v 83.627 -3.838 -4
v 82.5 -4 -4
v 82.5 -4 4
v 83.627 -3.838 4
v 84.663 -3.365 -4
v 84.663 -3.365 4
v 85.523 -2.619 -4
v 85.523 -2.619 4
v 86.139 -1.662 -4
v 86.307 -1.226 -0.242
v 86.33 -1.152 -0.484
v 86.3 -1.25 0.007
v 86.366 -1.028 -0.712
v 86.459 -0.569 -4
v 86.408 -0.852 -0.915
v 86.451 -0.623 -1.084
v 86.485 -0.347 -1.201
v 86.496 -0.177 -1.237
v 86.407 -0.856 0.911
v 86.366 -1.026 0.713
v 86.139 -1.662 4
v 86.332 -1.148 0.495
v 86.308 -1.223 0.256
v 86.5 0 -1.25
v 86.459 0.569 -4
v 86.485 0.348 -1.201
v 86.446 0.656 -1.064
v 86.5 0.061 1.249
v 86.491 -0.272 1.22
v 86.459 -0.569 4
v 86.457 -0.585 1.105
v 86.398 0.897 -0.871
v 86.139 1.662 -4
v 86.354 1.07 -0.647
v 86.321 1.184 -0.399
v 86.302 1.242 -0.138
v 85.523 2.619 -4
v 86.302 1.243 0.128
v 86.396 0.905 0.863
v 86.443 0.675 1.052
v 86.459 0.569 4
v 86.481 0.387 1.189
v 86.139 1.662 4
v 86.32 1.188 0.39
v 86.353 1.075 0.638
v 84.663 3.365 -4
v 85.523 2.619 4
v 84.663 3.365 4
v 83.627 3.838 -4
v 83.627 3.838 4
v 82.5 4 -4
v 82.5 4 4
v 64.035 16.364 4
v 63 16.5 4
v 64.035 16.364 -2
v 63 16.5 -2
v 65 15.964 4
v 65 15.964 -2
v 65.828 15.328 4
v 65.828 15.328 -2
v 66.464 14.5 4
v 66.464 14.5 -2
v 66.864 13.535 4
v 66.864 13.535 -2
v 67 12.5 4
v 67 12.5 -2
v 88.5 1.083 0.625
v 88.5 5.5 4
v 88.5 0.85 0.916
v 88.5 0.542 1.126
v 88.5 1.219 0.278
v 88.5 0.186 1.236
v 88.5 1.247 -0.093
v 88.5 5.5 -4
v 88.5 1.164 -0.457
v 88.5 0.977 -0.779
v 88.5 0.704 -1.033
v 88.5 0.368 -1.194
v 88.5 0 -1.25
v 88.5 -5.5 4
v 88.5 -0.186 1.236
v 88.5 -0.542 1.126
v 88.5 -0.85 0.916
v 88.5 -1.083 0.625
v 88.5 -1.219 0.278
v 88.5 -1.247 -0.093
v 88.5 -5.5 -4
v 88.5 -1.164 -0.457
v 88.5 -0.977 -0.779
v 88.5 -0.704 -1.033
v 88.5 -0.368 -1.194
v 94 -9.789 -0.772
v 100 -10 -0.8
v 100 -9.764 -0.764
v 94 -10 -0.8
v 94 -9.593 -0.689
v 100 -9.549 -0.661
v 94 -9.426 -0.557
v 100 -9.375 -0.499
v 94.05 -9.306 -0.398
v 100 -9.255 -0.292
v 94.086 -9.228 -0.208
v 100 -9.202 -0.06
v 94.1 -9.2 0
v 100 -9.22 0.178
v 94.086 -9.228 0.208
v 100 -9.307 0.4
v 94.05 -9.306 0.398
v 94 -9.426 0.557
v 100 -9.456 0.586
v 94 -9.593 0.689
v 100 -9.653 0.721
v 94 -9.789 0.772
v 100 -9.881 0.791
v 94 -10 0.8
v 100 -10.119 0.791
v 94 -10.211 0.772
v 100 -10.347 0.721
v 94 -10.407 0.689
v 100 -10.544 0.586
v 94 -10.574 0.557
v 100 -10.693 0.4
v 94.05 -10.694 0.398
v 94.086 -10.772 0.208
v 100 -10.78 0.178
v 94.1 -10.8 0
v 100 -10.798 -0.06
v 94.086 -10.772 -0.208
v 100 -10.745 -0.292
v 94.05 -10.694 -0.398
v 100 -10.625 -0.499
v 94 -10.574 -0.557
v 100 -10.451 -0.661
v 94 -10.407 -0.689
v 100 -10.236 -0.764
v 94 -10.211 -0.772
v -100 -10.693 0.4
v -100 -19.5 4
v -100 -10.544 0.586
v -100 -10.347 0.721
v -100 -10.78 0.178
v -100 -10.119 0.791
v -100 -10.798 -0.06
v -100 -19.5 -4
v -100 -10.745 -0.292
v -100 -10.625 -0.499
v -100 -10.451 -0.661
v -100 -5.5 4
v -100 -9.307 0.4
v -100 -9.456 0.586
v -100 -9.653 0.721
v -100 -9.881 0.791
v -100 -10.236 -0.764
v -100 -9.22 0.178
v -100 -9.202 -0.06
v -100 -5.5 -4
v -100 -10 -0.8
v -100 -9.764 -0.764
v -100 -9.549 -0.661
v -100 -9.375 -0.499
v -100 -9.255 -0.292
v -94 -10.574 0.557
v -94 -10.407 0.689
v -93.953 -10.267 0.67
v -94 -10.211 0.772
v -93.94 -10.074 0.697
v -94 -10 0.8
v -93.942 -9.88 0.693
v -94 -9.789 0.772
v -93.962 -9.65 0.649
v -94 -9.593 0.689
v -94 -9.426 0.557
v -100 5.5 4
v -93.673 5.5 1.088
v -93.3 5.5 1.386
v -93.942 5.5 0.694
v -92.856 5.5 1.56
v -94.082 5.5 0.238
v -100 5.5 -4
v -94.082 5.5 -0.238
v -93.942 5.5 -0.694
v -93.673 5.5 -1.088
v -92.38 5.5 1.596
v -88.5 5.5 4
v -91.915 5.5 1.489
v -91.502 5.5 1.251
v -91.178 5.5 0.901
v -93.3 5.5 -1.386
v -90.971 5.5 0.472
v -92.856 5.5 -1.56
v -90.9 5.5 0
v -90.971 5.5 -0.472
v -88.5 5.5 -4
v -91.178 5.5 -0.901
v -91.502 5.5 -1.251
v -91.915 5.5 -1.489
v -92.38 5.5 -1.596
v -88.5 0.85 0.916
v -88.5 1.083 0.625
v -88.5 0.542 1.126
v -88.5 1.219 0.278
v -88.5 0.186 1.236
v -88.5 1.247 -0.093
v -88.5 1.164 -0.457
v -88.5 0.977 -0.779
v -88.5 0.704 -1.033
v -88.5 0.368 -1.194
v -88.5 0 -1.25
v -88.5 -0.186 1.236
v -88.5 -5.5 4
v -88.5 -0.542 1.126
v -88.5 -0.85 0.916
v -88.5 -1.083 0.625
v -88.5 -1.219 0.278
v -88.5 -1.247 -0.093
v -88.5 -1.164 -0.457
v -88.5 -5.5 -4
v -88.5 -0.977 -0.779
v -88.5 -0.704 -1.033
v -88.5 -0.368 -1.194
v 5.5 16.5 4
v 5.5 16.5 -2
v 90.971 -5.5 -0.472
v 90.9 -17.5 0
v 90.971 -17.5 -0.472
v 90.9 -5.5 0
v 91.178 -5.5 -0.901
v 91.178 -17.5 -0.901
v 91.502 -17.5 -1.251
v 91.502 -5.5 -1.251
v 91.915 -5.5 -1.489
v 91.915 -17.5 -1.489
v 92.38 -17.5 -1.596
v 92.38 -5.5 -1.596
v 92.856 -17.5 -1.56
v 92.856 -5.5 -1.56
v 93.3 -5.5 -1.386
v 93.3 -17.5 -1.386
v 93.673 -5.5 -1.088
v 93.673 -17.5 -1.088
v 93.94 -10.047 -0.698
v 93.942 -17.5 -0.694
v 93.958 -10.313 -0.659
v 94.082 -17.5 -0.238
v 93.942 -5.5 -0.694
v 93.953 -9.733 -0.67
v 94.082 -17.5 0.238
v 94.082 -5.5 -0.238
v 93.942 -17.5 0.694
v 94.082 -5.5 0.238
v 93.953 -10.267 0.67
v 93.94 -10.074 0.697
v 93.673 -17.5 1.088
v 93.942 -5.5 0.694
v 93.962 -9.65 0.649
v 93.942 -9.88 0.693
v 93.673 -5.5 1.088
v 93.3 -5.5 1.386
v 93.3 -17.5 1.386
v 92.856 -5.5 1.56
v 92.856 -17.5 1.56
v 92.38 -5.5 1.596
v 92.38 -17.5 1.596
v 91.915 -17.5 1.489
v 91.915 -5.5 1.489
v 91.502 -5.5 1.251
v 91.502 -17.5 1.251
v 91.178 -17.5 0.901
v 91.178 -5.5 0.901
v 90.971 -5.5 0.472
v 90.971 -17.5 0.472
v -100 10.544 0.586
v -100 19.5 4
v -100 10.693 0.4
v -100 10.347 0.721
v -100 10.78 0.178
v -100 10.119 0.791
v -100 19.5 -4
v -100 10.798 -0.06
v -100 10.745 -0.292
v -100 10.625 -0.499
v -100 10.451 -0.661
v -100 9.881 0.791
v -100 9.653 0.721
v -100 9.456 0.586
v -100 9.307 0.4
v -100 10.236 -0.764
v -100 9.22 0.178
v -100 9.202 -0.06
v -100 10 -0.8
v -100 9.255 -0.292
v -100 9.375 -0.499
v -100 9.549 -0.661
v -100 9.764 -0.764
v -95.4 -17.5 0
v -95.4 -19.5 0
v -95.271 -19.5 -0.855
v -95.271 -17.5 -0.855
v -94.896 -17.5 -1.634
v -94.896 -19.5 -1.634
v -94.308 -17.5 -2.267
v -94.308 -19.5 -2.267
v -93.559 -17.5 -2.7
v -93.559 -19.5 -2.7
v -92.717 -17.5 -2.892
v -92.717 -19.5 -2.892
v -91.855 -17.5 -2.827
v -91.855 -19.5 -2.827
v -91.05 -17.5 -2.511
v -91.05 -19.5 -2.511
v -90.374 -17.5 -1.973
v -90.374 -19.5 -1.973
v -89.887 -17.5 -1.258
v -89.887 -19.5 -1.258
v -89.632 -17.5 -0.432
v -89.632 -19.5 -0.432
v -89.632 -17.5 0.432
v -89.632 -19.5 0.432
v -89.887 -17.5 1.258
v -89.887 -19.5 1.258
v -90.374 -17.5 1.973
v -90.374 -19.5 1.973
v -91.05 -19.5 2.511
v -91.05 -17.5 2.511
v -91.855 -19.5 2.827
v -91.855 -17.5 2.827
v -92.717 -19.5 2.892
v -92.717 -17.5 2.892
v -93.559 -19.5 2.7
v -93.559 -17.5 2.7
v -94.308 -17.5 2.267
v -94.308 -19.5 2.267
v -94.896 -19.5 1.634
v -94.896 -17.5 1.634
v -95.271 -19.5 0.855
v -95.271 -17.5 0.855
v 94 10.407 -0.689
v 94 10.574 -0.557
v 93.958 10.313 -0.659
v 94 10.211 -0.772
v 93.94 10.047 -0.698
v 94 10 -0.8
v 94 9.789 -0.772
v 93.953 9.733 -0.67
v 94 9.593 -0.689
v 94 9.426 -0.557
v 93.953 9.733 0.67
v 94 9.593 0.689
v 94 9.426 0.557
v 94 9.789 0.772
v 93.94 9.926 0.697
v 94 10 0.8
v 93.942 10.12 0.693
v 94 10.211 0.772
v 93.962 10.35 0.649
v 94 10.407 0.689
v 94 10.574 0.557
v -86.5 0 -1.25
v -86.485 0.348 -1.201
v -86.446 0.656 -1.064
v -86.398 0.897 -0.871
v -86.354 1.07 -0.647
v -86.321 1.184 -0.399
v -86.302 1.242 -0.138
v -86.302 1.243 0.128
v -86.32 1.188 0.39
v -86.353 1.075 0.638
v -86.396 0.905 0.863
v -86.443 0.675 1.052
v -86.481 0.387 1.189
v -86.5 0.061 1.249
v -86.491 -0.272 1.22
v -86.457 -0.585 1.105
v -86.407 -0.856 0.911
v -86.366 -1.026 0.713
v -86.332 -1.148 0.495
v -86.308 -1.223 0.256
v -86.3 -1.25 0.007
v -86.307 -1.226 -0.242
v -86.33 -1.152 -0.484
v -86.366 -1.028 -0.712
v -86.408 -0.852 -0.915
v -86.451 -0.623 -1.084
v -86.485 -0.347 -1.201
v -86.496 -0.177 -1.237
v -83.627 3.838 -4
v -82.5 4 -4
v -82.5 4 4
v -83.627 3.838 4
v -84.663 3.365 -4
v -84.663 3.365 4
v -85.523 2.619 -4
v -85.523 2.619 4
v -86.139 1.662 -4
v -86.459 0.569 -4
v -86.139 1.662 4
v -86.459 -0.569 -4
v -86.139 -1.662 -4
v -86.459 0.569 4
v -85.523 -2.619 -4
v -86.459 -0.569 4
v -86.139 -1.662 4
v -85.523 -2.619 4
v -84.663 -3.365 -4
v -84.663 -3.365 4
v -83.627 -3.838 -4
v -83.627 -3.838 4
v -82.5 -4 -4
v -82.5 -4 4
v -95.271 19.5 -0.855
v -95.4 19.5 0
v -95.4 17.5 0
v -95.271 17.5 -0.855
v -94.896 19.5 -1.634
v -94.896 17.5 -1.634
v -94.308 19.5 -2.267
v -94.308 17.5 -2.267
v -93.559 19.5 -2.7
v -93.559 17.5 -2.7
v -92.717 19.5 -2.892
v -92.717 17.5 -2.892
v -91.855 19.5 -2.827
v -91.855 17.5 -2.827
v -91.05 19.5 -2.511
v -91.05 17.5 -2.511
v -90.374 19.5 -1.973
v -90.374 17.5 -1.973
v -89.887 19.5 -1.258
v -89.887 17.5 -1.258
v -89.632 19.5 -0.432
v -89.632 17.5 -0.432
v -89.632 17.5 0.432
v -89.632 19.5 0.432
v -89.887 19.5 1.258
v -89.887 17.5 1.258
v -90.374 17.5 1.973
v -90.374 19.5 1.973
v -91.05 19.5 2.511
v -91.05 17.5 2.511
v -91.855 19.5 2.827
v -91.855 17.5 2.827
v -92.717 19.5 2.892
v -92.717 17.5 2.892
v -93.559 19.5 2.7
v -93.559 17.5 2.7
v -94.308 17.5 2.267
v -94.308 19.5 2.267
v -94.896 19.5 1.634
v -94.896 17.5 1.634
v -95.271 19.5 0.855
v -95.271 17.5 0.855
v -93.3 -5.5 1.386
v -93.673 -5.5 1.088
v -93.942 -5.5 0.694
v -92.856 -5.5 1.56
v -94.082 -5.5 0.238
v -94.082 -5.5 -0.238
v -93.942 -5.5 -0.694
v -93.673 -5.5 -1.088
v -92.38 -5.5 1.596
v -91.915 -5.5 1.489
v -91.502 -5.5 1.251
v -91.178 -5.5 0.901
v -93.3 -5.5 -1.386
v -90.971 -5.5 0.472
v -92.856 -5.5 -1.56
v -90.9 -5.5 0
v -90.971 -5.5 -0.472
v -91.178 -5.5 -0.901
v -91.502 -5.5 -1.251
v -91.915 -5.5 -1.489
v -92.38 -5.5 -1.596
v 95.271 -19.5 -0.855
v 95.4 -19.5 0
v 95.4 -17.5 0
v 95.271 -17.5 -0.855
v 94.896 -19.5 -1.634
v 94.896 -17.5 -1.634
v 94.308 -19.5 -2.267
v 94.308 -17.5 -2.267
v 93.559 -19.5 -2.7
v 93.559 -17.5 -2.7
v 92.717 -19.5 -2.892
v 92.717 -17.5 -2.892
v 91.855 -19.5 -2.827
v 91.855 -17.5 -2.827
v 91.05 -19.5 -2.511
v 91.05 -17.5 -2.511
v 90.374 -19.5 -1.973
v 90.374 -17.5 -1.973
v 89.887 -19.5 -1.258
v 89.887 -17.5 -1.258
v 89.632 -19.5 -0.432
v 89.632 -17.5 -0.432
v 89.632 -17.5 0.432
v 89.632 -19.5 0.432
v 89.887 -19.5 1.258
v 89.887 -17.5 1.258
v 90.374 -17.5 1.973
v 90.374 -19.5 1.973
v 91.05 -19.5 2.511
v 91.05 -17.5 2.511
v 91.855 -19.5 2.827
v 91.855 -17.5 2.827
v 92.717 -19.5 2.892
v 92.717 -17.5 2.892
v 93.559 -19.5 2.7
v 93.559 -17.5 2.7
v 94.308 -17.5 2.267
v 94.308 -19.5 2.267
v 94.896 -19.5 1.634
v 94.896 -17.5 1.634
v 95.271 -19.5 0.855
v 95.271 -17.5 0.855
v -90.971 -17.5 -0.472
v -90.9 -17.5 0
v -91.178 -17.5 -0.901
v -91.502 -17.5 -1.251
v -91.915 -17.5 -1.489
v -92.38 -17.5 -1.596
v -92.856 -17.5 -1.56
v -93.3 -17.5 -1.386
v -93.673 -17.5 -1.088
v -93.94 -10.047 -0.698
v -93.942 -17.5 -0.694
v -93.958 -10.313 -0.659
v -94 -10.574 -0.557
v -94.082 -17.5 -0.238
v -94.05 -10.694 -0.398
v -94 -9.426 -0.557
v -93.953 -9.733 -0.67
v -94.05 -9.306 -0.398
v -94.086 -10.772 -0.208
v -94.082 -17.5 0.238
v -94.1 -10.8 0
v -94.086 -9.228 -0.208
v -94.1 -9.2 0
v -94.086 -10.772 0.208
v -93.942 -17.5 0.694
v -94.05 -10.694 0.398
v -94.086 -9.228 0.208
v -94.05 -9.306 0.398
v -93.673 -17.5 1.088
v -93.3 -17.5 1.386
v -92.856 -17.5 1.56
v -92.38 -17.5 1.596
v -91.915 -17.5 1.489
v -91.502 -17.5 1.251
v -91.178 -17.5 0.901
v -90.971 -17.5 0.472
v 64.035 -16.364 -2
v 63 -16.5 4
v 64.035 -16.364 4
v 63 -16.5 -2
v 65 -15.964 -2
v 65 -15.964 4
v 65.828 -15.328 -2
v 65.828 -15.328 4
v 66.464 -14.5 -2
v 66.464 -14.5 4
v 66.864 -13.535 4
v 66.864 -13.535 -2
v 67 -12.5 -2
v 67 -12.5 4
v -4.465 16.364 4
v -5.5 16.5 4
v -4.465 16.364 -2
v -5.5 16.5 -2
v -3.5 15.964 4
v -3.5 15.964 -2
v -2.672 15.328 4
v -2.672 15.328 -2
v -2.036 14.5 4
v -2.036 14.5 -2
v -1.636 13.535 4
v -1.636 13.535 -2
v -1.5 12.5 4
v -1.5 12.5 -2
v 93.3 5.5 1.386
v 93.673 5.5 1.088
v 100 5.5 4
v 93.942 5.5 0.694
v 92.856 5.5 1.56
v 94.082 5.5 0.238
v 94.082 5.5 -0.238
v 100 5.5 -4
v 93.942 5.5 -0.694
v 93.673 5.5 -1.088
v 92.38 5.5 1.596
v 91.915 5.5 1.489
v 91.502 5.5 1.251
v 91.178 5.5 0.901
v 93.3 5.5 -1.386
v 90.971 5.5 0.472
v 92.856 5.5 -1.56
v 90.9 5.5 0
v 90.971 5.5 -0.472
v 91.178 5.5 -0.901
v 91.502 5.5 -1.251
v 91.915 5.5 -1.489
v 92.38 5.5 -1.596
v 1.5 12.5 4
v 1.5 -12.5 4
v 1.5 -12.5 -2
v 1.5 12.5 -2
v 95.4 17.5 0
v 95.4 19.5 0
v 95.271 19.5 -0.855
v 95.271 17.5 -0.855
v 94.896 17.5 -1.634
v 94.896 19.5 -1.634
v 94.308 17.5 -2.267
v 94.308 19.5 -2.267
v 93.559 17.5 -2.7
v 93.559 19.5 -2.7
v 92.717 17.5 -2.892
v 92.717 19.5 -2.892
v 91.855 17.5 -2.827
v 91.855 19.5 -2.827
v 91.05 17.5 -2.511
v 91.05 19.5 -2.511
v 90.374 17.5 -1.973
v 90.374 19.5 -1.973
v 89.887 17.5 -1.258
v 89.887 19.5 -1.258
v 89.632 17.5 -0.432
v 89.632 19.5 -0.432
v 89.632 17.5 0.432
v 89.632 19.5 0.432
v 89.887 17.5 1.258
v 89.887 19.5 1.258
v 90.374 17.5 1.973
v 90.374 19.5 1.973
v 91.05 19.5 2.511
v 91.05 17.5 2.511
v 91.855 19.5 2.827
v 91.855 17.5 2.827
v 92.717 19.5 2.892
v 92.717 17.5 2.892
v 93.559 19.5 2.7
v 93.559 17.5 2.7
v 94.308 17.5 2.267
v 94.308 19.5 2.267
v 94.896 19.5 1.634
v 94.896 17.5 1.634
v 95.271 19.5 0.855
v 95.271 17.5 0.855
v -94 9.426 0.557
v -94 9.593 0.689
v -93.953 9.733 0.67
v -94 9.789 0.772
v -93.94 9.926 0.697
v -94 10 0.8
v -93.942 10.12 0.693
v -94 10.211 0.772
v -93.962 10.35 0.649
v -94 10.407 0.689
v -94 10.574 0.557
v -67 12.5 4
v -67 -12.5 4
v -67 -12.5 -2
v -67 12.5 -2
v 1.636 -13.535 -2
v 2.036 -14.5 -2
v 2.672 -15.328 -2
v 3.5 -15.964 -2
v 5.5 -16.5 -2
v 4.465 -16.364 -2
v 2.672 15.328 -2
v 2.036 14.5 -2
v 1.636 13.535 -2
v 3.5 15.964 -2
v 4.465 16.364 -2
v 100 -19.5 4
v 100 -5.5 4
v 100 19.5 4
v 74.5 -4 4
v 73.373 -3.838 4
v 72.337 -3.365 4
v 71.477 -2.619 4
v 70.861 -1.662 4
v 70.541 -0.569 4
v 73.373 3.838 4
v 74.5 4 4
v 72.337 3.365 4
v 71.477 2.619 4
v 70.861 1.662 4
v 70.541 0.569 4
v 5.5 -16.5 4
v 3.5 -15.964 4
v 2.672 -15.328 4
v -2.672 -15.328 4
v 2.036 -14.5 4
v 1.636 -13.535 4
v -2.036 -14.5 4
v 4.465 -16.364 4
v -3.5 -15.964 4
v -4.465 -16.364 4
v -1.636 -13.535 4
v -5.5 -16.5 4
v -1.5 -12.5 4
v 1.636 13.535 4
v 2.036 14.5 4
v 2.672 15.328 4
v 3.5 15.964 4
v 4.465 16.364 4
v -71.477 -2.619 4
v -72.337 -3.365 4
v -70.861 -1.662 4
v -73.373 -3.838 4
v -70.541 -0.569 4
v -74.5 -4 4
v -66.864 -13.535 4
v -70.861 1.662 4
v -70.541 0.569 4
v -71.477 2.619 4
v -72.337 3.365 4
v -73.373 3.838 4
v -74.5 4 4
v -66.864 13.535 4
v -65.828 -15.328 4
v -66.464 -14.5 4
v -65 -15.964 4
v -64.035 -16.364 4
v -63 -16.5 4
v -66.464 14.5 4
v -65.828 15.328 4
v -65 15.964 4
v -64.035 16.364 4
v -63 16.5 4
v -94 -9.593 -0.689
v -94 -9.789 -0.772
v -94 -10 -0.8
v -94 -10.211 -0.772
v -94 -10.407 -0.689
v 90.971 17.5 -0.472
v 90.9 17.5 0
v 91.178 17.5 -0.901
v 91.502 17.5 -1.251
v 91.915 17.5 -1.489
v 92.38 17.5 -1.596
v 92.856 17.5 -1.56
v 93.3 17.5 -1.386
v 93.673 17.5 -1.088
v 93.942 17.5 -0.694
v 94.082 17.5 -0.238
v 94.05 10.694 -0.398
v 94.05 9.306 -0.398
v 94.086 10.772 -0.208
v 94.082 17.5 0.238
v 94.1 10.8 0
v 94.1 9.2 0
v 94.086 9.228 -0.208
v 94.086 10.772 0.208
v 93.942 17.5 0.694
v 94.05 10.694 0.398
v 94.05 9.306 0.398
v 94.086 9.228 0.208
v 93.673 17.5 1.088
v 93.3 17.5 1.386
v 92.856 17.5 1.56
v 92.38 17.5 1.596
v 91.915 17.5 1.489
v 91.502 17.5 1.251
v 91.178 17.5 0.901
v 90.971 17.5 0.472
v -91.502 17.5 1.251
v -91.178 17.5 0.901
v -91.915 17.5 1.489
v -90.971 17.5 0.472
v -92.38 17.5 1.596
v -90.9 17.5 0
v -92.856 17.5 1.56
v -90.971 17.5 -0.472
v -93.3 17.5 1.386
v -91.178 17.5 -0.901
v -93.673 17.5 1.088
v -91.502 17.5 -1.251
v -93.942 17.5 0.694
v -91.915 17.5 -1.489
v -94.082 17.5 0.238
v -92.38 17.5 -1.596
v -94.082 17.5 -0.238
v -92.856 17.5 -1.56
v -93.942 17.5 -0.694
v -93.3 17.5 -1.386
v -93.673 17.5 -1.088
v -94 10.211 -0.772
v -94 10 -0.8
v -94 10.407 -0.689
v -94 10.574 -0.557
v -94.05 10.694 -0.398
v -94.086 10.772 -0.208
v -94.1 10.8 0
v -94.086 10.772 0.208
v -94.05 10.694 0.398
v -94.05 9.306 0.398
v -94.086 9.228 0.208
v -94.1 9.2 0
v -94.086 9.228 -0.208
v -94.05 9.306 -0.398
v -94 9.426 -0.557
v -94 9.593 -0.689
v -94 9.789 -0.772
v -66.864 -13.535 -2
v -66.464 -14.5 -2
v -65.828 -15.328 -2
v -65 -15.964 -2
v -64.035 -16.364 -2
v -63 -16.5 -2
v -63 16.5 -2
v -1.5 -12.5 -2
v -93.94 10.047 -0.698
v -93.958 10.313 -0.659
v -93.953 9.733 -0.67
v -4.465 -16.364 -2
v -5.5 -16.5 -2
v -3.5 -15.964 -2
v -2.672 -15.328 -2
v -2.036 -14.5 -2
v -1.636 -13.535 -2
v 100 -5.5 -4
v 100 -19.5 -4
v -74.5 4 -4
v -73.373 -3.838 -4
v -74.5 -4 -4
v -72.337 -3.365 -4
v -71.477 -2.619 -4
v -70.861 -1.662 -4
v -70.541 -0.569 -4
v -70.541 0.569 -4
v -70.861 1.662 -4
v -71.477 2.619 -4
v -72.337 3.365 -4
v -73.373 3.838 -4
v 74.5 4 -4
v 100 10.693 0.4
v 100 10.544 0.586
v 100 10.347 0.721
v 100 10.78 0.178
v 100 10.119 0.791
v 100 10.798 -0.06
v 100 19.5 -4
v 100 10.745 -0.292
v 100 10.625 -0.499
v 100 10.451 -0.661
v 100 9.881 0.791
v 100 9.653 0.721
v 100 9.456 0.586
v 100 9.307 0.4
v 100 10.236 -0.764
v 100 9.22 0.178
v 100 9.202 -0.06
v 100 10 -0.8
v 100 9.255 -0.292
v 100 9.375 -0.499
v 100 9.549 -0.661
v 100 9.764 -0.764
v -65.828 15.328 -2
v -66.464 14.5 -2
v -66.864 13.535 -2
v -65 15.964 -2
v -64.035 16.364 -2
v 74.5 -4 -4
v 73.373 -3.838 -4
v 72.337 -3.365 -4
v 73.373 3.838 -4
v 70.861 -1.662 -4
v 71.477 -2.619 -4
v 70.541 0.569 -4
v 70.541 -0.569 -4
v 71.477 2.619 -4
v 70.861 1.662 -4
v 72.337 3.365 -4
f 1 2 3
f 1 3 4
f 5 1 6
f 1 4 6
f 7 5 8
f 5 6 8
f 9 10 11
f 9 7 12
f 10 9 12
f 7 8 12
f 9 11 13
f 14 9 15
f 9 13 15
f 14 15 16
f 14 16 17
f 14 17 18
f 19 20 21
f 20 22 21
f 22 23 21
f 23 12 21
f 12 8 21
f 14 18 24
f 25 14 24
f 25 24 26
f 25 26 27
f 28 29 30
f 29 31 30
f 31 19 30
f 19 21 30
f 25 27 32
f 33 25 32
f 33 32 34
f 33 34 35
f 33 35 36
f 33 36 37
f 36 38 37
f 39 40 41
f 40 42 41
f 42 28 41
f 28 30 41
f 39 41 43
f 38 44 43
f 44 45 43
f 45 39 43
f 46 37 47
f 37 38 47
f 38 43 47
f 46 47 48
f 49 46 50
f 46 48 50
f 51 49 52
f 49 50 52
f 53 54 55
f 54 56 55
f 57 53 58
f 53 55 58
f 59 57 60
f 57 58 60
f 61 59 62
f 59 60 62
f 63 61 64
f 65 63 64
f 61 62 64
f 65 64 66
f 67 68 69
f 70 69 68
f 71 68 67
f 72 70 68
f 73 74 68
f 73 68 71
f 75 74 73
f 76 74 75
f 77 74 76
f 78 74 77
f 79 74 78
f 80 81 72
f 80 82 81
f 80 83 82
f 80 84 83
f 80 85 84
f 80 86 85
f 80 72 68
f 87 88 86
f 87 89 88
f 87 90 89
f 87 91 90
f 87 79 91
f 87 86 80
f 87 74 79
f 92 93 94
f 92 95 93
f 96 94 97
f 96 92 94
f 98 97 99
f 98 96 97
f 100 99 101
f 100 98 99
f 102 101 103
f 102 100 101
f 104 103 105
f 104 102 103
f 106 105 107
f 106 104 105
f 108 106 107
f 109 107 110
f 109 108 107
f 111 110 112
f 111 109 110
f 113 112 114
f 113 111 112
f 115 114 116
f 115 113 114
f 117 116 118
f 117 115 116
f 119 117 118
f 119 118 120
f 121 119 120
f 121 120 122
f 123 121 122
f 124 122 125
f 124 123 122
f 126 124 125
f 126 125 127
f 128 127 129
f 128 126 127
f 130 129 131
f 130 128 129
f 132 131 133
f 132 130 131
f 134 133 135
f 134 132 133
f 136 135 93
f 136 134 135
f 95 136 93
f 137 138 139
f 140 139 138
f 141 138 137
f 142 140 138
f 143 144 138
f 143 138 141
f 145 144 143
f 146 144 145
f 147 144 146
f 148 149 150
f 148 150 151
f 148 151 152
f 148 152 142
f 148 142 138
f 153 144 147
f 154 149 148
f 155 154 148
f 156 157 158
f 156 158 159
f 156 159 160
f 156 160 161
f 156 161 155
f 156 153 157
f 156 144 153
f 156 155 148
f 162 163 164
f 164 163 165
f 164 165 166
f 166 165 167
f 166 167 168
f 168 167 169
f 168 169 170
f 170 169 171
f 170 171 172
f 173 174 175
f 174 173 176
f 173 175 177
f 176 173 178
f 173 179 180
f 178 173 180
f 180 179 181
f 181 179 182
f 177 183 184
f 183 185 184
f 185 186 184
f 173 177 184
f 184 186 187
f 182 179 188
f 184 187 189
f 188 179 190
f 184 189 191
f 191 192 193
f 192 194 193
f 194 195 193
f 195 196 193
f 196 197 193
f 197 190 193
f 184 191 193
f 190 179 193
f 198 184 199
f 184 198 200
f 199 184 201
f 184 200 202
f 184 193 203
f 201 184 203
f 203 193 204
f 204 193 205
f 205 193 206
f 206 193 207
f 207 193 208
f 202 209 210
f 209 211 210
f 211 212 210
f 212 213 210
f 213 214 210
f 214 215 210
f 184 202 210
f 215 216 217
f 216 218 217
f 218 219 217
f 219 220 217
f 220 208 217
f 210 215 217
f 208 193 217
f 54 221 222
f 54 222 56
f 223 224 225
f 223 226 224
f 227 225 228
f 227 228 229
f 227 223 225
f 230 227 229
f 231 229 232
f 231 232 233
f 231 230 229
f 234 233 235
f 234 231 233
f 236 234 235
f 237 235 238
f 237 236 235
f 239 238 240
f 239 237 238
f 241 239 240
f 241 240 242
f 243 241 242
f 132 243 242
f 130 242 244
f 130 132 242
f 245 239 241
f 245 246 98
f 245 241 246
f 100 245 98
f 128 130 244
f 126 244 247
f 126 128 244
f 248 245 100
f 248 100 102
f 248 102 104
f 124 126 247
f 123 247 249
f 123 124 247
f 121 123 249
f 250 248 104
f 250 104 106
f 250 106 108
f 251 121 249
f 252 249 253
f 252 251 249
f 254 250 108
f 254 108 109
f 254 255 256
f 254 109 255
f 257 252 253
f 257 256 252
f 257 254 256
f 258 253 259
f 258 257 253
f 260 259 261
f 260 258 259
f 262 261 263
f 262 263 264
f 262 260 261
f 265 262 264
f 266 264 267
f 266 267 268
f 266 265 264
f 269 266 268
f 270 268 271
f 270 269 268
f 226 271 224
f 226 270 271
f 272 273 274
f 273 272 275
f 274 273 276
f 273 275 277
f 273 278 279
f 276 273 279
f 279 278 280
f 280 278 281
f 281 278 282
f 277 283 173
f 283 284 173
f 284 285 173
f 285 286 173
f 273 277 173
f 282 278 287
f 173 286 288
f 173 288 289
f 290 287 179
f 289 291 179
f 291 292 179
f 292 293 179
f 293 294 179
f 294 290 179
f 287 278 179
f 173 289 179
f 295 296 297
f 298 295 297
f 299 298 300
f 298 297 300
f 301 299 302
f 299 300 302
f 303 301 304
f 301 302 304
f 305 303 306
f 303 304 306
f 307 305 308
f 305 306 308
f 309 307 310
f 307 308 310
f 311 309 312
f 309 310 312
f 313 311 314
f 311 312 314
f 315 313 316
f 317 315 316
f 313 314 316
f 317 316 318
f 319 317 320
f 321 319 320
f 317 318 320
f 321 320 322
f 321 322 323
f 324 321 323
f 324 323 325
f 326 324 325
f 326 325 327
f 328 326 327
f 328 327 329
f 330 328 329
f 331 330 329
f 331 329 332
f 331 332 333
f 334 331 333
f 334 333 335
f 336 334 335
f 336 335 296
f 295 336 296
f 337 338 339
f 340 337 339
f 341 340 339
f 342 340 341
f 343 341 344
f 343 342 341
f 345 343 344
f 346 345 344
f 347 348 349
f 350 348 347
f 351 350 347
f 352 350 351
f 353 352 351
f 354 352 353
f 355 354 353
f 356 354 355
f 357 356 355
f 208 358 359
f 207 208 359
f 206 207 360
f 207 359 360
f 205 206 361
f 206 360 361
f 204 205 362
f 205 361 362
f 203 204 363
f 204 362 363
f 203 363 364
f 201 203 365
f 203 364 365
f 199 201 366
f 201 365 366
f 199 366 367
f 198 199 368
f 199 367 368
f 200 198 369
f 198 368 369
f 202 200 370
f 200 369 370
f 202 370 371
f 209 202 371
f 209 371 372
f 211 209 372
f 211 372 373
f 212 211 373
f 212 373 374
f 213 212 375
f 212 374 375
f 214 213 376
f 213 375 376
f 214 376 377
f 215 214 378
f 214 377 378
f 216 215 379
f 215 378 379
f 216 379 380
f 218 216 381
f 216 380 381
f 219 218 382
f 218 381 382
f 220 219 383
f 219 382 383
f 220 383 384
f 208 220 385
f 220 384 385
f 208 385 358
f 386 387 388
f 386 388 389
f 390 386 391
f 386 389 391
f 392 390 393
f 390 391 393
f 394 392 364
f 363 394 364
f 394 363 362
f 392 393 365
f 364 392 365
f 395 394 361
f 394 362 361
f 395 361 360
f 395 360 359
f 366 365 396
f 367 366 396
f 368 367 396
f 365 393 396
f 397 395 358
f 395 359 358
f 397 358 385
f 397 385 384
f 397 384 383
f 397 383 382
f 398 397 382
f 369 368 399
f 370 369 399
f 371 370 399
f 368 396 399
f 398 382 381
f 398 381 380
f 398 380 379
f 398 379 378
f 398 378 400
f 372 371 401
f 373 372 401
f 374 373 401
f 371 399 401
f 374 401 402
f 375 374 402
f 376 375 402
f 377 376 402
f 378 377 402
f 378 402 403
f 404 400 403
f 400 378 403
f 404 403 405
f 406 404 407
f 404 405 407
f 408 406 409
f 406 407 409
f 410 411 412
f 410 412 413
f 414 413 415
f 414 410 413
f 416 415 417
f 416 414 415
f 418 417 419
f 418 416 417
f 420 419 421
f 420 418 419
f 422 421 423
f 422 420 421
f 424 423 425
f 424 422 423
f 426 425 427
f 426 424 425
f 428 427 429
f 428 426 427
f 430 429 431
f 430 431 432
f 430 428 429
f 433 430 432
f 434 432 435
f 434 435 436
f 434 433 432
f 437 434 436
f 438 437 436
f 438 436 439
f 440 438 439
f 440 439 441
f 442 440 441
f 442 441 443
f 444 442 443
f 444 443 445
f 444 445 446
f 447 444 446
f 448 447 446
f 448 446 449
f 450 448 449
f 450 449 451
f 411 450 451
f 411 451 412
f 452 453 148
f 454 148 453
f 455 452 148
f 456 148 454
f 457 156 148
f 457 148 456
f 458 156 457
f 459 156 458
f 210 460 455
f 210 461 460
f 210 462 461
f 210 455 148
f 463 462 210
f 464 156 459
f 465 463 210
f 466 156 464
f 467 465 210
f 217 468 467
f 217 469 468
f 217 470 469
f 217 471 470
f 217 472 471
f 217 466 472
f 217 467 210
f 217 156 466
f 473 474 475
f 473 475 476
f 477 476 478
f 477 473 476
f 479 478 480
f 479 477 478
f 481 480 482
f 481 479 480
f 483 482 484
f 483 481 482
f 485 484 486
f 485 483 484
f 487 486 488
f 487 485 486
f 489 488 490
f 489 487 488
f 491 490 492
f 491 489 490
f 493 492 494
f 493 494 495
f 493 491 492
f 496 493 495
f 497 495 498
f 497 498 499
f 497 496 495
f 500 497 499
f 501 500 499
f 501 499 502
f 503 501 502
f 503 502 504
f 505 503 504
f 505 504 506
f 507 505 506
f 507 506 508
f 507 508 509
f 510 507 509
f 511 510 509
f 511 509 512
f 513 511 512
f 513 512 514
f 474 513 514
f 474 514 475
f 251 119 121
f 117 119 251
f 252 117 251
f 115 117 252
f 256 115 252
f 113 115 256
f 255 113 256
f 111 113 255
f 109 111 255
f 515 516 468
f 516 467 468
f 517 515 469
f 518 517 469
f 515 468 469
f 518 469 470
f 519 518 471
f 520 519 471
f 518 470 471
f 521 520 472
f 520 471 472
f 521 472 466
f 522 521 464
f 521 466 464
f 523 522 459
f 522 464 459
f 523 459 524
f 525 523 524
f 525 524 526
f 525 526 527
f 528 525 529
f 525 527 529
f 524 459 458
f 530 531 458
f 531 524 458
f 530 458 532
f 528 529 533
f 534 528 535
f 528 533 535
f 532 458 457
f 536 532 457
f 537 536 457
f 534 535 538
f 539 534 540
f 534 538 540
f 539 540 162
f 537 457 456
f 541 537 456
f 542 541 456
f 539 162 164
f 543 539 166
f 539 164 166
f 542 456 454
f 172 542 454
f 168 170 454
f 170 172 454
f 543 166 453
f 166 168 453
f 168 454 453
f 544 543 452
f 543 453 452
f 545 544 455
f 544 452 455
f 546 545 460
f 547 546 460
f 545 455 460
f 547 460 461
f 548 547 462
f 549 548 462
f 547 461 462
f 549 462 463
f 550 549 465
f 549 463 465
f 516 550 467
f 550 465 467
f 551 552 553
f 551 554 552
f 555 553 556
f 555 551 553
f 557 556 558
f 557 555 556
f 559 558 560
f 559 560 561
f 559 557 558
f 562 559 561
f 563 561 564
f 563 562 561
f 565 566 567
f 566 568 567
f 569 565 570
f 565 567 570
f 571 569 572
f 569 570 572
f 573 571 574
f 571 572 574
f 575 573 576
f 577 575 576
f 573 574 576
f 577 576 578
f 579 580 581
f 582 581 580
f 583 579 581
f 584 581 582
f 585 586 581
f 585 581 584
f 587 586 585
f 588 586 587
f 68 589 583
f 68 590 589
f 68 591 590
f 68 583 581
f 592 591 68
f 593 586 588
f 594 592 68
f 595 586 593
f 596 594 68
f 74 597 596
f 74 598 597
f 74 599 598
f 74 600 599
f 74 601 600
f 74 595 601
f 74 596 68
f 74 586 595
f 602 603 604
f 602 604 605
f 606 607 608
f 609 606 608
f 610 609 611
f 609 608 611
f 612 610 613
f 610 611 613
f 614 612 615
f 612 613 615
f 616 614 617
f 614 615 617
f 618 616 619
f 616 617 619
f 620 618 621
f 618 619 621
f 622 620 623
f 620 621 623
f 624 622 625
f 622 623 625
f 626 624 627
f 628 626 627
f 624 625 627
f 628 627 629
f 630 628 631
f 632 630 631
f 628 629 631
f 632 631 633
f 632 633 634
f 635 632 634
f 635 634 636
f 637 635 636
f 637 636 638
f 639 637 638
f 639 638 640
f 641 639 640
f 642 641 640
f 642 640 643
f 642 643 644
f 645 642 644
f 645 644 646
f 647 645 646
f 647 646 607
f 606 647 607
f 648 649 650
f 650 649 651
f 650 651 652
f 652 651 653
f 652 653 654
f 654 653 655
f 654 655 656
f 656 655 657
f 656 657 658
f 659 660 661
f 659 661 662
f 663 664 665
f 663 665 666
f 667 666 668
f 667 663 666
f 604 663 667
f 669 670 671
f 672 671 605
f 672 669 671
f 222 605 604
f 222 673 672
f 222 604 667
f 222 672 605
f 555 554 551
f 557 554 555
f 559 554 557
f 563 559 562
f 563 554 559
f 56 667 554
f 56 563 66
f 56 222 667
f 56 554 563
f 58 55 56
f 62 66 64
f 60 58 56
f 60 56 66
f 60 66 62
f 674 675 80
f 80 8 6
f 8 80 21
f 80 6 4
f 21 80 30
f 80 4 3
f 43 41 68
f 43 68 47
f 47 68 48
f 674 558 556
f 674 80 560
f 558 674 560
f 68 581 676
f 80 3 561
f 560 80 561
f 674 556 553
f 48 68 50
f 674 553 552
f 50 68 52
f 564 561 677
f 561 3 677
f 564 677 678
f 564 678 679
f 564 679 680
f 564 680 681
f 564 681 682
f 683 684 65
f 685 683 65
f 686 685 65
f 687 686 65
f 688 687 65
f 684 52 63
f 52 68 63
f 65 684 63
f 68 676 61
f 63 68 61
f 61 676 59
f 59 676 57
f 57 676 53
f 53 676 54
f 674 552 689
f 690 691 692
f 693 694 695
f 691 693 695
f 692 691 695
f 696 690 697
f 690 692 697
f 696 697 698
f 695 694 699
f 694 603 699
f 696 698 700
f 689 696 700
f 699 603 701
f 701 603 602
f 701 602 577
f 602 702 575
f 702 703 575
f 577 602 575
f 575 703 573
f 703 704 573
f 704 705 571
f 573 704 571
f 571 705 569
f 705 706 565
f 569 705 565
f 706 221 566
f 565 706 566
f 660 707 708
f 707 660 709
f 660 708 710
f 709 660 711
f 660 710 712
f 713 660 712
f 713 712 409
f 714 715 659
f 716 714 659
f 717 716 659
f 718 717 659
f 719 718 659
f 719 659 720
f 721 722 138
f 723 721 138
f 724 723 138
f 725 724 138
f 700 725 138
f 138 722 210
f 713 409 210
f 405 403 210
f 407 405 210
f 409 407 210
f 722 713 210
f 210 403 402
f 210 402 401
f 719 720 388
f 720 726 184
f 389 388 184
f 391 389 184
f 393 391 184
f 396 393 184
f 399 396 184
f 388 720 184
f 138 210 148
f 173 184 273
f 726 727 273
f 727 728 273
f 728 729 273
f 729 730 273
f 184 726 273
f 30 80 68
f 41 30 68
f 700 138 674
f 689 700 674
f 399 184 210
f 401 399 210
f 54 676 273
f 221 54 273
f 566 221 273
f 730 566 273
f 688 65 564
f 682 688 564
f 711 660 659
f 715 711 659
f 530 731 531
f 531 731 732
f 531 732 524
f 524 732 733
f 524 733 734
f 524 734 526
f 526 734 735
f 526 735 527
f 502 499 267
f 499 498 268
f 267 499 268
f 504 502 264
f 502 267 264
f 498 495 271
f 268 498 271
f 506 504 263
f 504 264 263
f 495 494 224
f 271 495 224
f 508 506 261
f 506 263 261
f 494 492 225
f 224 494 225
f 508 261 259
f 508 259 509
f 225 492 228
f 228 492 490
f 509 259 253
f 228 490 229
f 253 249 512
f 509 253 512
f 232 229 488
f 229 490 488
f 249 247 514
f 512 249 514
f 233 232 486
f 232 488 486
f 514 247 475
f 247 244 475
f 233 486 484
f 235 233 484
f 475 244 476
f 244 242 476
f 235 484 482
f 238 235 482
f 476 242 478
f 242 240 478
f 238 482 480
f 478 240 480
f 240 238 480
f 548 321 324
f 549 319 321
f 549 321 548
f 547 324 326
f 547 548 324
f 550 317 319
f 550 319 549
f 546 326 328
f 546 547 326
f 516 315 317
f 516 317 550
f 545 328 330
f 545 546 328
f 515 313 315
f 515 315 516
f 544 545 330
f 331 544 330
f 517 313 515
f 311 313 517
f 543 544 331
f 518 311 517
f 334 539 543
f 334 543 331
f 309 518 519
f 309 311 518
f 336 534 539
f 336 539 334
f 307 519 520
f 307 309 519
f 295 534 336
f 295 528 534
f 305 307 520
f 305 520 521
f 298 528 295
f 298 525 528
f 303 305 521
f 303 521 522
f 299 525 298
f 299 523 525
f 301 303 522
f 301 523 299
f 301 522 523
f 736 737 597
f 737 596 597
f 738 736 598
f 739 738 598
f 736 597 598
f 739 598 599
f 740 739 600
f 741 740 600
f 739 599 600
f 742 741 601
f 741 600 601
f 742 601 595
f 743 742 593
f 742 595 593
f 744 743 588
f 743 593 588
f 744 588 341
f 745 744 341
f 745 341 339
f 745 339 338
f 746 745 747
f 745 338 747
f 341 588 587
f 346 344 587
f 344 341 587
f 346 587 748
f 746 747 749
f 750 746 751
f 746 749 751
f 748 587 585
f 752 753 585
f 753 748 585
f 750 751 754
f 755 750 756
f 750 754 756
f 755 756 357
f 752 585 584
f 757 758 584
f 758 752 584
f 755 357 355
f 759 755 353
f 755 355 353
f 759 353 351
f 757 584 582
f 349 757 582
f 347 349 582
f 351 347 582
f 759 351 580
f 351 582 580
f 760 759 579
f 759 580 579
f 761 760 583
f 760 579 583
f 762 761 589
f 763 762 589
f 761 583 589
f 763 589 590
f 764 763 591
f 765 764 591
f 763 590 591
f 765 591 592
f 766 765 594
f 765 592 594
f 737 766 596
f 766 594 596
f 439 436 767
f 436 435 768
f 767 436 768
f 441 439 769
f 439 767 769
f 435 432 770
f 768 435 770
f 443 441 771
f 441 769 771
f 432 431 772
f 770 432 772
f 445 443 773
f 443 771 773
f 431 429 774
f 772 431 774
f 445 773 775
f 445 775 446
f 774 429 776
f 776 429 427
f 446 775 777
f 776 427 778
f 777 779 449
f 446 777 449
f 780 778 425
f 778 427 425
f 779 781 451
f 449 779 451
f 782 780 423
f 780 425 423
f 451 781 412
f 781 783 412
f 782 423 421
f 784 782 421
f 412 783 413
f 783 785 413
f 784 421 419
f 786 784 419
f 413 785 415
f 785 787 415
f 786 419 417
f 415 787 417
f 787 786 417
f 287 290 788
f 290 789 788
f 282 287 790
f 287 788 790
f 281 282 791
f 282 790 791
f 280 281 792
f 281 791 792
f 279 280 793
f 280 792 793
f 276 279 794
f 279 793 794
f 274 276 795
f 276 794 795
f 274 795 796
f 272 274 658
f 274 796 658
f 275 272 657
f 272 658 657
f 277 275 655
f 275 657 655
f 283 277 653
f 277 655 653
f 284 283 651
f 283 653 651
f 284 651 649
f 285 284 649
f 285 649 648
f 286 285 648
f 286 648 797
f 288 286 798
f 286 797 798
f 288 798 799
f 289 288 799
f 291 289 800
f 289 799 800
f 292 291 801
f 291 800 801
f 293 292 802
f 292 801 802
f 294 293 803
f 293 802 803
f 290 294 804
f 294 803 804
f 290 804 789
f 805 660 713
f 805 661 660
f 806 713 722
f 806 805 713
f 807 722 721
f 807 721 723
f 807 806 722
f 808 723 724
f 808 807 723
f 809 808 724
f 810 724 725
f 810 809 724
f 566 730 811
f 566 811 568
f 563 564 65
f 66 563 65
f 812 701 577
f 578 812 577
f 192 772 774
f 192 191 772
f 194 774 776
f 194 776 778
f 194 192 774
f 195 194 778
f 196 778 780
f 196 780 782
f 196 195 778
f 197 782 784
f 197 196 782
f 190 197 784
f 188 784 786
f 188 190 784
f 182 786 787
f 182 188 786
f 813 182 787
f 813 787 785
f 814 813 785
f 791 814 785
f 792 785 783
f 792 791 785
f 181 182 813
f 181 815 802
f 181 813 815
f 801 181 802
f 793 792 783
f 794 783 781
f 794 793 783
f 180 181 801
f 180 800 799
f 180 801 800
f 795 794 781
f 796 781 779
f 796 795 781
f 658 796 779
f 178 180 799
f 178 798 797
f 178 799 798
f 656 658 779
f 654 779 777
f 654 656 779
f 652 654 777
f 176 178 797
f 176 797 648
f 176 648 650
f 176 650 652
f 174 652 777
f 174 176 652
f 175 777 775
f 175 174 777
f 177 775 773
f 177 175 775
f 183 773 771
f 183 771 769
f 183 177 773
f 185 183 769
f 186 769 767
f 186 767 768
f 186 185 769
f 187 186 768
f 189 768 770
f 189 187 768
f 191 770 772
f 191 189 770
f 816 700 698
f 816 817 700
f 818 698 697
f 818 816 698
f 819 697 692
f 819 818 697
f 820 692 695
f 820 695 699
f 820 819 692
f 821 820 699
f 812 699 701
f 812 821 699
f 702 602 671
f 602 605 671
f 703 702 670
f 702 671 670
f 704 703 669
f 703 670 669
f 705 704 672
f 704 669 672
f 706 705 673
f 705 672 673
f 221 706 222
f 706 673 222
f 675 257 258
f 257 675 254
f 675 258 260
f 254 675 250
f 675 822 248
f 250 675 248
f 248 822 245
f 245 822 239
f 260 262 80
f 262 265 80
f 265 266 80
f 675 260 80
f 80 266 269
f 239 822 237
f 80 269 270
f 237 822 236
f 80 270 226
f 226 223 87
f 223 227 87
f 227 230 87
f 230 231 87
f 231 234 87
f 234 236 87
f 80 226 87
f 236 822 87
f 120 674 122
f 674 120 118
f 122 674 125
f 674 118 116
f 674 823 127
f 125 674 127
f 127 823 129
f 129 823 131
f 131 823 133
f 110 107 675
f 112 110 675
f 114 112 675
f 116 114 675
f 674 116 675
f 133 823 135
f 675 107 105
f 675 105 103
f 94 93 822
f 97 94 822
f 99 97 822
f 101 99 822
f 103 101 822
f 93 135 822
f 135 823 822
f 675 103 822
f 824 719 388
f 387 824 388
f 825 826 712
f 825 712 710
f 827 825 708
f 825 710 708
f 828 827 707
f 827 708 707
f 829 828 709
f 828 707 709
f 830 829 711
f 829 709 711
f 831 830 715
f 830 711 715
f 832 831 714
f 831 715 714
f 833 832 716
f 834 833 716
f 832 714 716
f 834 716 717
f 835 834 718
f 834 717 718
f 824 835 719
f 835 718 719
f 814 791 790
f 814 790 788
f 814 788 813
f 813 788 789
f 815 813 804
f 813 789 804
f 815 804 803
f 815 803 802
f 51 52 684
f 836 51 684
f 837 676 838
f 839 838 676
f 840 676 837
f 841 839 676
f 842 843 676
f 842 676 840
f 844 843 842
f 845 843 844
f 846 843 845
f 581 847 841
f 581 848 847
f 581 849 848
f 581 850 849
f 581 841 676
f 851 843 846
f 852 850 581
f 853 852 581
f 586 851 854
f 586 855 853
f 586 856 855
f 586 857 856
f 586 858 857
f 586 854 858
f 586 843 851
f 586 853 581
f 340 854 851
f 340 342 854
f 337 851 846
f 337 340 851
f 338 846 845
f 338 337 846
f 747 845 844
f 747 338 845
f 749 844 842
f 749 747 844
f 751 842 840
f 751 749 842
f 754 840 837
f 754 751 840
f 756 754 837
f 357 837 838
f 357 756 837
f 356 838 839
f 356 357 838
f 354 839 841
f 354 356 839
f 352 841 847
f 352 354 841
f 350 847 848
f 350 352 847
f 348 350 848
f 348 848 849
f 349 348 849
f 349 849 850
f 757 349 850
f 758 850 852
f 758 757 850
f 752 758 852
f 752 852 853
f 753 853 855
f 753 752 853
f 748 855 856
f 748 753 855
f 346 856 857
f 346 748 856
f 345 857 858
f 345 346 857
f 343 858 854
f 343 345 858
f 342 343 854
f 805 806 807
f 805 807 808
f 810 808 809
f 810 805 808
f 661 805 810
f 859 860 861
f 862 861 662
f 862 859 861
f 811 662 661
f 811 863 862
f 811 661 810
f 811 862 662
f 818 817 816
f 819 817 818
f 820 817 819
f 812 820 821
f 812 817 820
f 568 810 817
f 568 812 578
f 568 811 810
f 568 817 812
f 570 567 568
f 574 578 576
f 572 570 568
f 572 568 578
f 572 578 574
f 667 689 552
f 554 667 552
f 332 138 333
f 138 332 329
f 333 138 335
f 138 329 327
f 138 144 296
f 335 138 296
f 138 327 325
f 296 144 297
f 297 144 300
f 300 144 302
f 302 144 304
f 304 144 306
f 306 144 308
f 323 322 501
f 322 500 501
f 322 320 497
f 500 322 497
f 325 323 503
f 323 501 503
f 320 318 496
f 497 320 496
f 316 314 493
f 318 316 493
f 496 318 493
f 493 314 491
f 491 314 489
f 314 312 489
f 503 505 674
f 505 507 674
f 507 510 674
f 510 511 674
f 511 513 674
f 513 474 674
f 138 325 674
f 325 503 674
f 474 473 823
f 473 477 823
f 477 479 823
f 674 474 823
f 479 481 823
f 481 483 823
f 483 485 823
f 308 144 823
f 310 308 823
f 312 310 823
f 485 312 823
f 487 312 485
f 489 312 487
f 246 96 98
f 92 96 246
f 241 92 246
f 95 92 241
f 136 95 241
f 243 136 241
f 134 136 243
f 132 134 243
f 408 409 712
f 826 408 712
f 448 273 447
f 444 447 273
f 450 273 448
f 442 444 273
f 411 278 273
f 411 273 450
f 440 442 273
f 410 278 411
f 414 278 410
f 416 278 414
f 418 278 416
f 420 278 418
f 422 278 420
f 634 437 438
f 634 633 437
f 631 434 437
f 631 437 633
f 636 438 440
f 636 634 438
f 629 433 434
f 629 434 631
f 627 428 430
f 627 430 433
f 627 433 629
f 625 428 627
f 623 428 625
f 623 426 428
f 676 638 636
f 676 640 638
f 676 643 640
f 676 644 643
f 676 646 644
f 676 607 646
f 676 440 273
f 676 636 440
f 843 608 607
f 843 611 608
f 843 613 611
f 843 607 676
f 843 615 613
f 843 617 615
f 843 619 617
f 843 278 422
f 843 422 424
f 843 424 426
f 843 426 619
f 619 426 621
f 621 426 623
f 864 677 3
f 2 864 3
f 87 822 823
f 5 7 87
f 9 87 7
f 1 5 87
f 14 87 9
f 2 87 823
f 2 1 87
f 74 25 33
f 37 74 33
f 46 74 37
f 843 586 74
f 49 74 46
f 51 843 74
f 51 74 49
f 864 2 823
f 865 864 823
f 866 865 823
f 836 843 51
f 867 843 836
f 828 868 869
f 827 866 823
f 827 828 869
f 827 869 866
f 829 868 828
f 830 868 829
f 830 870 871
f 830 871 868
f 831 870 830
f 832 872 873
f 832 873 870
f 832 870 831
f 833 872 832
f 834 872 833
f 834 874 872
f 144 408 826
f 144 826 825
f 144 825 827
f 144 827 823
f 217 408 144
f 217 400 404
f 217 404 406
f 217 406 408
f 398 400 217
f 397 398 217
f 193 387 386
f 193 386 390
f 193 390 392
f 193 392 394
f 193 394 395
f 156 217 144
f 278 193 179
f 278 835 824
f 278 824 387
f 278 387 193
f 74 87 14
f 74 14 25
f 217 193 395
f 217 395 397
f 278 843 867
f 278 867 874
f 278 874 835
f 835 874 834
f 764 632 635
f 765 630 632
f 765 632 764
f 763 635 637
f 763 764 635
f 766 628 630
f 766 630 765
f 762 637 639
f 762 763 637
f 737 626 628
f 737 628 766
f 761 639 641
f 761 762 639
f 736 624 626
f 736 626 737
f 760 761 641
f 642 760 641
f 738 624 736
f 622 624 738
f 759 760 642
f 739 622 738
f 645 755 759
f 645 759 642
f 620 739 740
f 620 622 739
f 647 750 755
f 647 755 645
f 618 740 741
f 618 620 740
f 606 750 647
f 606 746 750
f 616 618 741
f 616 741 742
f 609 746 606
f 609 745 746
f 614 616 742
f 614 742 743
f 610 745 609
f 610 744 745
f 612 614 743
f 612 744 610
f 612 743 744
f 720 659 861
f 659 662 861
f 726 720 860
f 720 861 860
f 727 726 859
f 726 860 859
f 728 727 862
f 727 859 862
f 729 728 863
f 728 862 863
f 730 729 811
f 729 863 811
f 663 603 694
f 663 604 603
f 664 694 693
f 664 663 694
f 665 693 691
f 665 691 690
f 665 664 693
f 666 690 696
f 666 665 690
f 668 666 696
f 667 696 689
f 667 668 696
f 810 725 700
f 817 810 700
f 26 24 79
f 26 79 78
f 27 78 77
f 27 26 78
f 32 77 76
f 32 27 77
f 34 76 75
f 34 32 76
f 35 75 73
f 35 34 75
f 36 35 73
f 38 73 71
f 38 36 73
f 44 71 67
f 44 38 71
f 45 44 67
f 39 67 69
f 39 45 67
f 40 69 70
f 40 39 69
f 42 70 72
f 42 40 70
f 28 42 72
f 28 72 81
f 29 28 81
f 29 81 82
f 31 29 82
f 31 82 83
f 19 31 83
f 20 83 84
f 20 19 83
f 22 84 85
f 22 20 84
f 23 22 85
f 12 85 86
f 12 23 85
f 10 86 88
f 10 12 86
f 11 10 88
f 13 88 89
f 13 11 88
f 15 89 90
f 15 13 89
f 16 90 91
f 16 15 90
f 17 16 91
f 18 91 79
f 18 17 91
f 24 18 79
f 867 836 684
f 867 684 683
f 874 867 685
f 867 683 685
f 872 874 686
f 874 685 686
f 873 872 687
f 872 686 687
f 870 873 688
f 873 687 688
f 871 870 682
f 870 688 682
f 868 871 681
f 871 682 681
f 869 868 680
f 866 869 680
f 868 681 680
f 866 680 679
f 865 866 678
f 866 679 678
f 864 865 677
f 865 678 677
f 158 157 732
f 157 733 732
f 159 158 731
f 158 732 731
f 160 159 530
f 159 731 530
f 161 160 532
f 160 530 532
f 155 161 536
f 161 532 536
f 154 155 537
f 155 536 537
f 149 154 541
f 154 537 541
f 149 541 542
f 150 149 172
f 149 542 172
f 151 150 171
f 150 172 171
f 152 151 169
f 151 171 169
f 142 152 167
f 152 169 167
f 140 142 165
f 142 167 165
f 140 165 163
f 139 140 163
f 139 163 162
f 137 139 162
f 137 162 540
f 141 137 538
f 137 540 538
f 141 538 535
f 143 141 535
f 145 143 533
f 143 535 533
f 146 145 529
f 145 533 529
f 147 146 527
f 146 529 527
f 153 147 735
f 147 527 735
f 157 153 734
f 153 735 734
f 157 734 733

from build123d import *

# Parameters (mm, degrees)
AUFSATZ_LINEAR_AUSTRAGEN1_DEPTH                      = 4
STIRNSENKUNG_F_R_M3_ZYLINDERSCHRAUBE_MIT_D           = 3.2
STIRNSENKUNG_F_R_M3_ZYLINDERSCHRAUBE_MIT_CBORE_D     = 5.8
STIRNSENKUNG_F_R_M3_ZYLINDERSCHRAUBE_MIT_CBORE_DEPTH = 2
M3_GEWINDEBOHRUNG1_D                                 = 2.5
M3_GEWINDEBOHRUNG1_DEPTH                             = 8.5
M3_GEWINDEBOHRUNG1_TIP                               = 0.751075774
M2_GEWINDEBOHRUNG1_D                                 = 1.6
M2_GEWINDEBOHRUNG1_DEPTH                             = 6
M2_GEWINDEBOHRUNG1_TIP                               = 0.480688495
SKIZZE3_W                                            = 65.5
SKIZZE3_H                                            = 33
SCHNITT_LINEAR_AUSTRAGEN1_DEPTH                      = 6
SCHNITT_LINEAR_AUSTRAGEN2_DEPTH                      = 9
VERRUNDUNG1_R                                        = 4


with BuildPart() as part:
    # Skizze2 → Aufsatz-Linear austragen1 (new body, symmetric)
    with BuildSketch(Plane(origin=(0, 0, 0), x_dir=(1, 0, 0), z_dir=(0, 0, -1))):
        Polygon((-100, 19.5), (-100, 5.5), (-88.5, 5.5), (-88.5, 0), (0, 0), (0, 19.5), align=None)
    extrude(amount=AUFSATZ_LINEAR_AUSTRAGEN1_DEPTH, both=True)

    # Stirnsenkung für  M3 Zylinderschraube mit Schlitz/Kreuzschlitz1 (through all)
    with Locations(Plane(origin=(0, -19.5, 0), x_dir=(-1, 0, 0), z_dir=(0, -1, 0))):
        with Locations((92.5, 0)):
            CounterBoreHole(STIRNSENKUNG_F_R_M3_ZYLINDERSCHRAUBE_MIT_D / 2, STIRNSENKUNG_F_R_M3_ZYLINDERSCHRAUBE_MIT_CBORE_D / 2, STIRNSENKUNG_F_R_M3_ZYLINDERSCHRAUBE_MIT_CBORE_DEPTH)

    # Spiegeln2: part across plane


with BuildPart() as part_1:
    add(part.part)
    add(part.part.mirror(Plane.ZX))

    # M3 Gewindebohrung1
    with Locations(Plane.ZY.offset(88.5)):
        with Locations((0, 0)):
            Hole(M3_GEWINDEBOHRUNG1_D / 2, depth=M3_GEWINDEBOHRUNG1_DEPTH)
            with Locations((0, 0, -(M3_GEWINDEBOHRUNG1_DEPTH + M3_GEWINDEBOHRUNG1_TIP / 2))):  # 118° drill point
                Cone(0, M3_GEWINDEBOHRUNG1_D / 2, M3_GEWINDEBOHRUNG1_TIP, mode=Mode.SUBTRACT)

    # M2 Gewindebohrung1
    with Locations(Plane.ZY.offset(100)):
        with Locations((0, 10), (0, -10)):
            Hole(M2_GEWINDEBOHRUNG1_D / 2, depth=M2_GEWINDEBOHRUNG1_DEPTH)
            with Locations((0, 0, -(M2_GEWINDEBOHRUNG1_DEPTH + M2_GEWINDEBOHRUNG1_TIP / 2))):  # 118° drill point
                Cone(0, M2_GEWINDEBOHRUNG1_D / 2, M2_GEWINDEBOHRUNG1_TIP, mode=Mode.SUBTRACT)

    # Spiegeln3: part across plane


with BuildPart() as part_2:
    add(part_1.part)
    add(part_1.part.mirror(Plane(origin=(0, 0, 0), x_dir=(0, 0, 1), z_dir=(1, 0, 0))))

    # Skizze3 → Schnitt-Linear austragen1 (cut)
    with BuildSketch(Plane.XY.offset(4)):
        with Locations((-34.25, 0)):
            Rectangle(SKIZZE3_W, SKIZZE3_H)
        with Locations((34.25, 0)):
            Rectangle(SKIZZE3_W, SKIZZE3_H)
    extrude(amount=-SCHNITT_LINEAR_AUSTRAGEN1_DEPTH, mode=Mode.SUBTRACT)

    # Skizze3<3> → Schnitt-Linear austragen2 (cut, through all)
    with BuildSketch(Plane.XY.offset(4)):
        with BuildLine():
            Line((-82.5, -4), (-74.5, -4))
            ThreePointArc((-74.5, -4), (-70.5, 0), (-74.5, 4))
            Line((-74.5, 4), (-82.5, 4))
            ThreePointArc((-82.5, 4), (-86.5, 0), (-82.5, -4))
        make_face()
        with BuildLine():
            Line((74.5, -4), (82.5, -4))
            ThreePointArc((82.5, -4), (86.5, 0), (82.5, 4))
            Line((82.5, 4), (74.5, 4))
            ThreePointArc((74.5, 4), (70.5, 0), (74.5, -4))
        make_face()
    extrude(amount=-SCHNITT_LINEAR_AUSTRAGEN2_DEPTH, mode=Mode.SUBTRACT)

    # Verrundung1
    verrundung1_edges = [part_2.edges().sort_by_distance(p)[0] for p in [
        (-67, 16.5, 1),
        (-67, -16.5, 1),
        (-1.5, -16.5, 1),
        (-1.5, 16.5, 1),
        (1.5, 16.5, 1),
        (1.5, -16.5, 1),
        (67, -16.5, 1),
        (67, 16.5, 1),
    ]]
    fillet(verrundung1_edges, radius=VERRUNDUNG1_R)


solid = part_2.part
